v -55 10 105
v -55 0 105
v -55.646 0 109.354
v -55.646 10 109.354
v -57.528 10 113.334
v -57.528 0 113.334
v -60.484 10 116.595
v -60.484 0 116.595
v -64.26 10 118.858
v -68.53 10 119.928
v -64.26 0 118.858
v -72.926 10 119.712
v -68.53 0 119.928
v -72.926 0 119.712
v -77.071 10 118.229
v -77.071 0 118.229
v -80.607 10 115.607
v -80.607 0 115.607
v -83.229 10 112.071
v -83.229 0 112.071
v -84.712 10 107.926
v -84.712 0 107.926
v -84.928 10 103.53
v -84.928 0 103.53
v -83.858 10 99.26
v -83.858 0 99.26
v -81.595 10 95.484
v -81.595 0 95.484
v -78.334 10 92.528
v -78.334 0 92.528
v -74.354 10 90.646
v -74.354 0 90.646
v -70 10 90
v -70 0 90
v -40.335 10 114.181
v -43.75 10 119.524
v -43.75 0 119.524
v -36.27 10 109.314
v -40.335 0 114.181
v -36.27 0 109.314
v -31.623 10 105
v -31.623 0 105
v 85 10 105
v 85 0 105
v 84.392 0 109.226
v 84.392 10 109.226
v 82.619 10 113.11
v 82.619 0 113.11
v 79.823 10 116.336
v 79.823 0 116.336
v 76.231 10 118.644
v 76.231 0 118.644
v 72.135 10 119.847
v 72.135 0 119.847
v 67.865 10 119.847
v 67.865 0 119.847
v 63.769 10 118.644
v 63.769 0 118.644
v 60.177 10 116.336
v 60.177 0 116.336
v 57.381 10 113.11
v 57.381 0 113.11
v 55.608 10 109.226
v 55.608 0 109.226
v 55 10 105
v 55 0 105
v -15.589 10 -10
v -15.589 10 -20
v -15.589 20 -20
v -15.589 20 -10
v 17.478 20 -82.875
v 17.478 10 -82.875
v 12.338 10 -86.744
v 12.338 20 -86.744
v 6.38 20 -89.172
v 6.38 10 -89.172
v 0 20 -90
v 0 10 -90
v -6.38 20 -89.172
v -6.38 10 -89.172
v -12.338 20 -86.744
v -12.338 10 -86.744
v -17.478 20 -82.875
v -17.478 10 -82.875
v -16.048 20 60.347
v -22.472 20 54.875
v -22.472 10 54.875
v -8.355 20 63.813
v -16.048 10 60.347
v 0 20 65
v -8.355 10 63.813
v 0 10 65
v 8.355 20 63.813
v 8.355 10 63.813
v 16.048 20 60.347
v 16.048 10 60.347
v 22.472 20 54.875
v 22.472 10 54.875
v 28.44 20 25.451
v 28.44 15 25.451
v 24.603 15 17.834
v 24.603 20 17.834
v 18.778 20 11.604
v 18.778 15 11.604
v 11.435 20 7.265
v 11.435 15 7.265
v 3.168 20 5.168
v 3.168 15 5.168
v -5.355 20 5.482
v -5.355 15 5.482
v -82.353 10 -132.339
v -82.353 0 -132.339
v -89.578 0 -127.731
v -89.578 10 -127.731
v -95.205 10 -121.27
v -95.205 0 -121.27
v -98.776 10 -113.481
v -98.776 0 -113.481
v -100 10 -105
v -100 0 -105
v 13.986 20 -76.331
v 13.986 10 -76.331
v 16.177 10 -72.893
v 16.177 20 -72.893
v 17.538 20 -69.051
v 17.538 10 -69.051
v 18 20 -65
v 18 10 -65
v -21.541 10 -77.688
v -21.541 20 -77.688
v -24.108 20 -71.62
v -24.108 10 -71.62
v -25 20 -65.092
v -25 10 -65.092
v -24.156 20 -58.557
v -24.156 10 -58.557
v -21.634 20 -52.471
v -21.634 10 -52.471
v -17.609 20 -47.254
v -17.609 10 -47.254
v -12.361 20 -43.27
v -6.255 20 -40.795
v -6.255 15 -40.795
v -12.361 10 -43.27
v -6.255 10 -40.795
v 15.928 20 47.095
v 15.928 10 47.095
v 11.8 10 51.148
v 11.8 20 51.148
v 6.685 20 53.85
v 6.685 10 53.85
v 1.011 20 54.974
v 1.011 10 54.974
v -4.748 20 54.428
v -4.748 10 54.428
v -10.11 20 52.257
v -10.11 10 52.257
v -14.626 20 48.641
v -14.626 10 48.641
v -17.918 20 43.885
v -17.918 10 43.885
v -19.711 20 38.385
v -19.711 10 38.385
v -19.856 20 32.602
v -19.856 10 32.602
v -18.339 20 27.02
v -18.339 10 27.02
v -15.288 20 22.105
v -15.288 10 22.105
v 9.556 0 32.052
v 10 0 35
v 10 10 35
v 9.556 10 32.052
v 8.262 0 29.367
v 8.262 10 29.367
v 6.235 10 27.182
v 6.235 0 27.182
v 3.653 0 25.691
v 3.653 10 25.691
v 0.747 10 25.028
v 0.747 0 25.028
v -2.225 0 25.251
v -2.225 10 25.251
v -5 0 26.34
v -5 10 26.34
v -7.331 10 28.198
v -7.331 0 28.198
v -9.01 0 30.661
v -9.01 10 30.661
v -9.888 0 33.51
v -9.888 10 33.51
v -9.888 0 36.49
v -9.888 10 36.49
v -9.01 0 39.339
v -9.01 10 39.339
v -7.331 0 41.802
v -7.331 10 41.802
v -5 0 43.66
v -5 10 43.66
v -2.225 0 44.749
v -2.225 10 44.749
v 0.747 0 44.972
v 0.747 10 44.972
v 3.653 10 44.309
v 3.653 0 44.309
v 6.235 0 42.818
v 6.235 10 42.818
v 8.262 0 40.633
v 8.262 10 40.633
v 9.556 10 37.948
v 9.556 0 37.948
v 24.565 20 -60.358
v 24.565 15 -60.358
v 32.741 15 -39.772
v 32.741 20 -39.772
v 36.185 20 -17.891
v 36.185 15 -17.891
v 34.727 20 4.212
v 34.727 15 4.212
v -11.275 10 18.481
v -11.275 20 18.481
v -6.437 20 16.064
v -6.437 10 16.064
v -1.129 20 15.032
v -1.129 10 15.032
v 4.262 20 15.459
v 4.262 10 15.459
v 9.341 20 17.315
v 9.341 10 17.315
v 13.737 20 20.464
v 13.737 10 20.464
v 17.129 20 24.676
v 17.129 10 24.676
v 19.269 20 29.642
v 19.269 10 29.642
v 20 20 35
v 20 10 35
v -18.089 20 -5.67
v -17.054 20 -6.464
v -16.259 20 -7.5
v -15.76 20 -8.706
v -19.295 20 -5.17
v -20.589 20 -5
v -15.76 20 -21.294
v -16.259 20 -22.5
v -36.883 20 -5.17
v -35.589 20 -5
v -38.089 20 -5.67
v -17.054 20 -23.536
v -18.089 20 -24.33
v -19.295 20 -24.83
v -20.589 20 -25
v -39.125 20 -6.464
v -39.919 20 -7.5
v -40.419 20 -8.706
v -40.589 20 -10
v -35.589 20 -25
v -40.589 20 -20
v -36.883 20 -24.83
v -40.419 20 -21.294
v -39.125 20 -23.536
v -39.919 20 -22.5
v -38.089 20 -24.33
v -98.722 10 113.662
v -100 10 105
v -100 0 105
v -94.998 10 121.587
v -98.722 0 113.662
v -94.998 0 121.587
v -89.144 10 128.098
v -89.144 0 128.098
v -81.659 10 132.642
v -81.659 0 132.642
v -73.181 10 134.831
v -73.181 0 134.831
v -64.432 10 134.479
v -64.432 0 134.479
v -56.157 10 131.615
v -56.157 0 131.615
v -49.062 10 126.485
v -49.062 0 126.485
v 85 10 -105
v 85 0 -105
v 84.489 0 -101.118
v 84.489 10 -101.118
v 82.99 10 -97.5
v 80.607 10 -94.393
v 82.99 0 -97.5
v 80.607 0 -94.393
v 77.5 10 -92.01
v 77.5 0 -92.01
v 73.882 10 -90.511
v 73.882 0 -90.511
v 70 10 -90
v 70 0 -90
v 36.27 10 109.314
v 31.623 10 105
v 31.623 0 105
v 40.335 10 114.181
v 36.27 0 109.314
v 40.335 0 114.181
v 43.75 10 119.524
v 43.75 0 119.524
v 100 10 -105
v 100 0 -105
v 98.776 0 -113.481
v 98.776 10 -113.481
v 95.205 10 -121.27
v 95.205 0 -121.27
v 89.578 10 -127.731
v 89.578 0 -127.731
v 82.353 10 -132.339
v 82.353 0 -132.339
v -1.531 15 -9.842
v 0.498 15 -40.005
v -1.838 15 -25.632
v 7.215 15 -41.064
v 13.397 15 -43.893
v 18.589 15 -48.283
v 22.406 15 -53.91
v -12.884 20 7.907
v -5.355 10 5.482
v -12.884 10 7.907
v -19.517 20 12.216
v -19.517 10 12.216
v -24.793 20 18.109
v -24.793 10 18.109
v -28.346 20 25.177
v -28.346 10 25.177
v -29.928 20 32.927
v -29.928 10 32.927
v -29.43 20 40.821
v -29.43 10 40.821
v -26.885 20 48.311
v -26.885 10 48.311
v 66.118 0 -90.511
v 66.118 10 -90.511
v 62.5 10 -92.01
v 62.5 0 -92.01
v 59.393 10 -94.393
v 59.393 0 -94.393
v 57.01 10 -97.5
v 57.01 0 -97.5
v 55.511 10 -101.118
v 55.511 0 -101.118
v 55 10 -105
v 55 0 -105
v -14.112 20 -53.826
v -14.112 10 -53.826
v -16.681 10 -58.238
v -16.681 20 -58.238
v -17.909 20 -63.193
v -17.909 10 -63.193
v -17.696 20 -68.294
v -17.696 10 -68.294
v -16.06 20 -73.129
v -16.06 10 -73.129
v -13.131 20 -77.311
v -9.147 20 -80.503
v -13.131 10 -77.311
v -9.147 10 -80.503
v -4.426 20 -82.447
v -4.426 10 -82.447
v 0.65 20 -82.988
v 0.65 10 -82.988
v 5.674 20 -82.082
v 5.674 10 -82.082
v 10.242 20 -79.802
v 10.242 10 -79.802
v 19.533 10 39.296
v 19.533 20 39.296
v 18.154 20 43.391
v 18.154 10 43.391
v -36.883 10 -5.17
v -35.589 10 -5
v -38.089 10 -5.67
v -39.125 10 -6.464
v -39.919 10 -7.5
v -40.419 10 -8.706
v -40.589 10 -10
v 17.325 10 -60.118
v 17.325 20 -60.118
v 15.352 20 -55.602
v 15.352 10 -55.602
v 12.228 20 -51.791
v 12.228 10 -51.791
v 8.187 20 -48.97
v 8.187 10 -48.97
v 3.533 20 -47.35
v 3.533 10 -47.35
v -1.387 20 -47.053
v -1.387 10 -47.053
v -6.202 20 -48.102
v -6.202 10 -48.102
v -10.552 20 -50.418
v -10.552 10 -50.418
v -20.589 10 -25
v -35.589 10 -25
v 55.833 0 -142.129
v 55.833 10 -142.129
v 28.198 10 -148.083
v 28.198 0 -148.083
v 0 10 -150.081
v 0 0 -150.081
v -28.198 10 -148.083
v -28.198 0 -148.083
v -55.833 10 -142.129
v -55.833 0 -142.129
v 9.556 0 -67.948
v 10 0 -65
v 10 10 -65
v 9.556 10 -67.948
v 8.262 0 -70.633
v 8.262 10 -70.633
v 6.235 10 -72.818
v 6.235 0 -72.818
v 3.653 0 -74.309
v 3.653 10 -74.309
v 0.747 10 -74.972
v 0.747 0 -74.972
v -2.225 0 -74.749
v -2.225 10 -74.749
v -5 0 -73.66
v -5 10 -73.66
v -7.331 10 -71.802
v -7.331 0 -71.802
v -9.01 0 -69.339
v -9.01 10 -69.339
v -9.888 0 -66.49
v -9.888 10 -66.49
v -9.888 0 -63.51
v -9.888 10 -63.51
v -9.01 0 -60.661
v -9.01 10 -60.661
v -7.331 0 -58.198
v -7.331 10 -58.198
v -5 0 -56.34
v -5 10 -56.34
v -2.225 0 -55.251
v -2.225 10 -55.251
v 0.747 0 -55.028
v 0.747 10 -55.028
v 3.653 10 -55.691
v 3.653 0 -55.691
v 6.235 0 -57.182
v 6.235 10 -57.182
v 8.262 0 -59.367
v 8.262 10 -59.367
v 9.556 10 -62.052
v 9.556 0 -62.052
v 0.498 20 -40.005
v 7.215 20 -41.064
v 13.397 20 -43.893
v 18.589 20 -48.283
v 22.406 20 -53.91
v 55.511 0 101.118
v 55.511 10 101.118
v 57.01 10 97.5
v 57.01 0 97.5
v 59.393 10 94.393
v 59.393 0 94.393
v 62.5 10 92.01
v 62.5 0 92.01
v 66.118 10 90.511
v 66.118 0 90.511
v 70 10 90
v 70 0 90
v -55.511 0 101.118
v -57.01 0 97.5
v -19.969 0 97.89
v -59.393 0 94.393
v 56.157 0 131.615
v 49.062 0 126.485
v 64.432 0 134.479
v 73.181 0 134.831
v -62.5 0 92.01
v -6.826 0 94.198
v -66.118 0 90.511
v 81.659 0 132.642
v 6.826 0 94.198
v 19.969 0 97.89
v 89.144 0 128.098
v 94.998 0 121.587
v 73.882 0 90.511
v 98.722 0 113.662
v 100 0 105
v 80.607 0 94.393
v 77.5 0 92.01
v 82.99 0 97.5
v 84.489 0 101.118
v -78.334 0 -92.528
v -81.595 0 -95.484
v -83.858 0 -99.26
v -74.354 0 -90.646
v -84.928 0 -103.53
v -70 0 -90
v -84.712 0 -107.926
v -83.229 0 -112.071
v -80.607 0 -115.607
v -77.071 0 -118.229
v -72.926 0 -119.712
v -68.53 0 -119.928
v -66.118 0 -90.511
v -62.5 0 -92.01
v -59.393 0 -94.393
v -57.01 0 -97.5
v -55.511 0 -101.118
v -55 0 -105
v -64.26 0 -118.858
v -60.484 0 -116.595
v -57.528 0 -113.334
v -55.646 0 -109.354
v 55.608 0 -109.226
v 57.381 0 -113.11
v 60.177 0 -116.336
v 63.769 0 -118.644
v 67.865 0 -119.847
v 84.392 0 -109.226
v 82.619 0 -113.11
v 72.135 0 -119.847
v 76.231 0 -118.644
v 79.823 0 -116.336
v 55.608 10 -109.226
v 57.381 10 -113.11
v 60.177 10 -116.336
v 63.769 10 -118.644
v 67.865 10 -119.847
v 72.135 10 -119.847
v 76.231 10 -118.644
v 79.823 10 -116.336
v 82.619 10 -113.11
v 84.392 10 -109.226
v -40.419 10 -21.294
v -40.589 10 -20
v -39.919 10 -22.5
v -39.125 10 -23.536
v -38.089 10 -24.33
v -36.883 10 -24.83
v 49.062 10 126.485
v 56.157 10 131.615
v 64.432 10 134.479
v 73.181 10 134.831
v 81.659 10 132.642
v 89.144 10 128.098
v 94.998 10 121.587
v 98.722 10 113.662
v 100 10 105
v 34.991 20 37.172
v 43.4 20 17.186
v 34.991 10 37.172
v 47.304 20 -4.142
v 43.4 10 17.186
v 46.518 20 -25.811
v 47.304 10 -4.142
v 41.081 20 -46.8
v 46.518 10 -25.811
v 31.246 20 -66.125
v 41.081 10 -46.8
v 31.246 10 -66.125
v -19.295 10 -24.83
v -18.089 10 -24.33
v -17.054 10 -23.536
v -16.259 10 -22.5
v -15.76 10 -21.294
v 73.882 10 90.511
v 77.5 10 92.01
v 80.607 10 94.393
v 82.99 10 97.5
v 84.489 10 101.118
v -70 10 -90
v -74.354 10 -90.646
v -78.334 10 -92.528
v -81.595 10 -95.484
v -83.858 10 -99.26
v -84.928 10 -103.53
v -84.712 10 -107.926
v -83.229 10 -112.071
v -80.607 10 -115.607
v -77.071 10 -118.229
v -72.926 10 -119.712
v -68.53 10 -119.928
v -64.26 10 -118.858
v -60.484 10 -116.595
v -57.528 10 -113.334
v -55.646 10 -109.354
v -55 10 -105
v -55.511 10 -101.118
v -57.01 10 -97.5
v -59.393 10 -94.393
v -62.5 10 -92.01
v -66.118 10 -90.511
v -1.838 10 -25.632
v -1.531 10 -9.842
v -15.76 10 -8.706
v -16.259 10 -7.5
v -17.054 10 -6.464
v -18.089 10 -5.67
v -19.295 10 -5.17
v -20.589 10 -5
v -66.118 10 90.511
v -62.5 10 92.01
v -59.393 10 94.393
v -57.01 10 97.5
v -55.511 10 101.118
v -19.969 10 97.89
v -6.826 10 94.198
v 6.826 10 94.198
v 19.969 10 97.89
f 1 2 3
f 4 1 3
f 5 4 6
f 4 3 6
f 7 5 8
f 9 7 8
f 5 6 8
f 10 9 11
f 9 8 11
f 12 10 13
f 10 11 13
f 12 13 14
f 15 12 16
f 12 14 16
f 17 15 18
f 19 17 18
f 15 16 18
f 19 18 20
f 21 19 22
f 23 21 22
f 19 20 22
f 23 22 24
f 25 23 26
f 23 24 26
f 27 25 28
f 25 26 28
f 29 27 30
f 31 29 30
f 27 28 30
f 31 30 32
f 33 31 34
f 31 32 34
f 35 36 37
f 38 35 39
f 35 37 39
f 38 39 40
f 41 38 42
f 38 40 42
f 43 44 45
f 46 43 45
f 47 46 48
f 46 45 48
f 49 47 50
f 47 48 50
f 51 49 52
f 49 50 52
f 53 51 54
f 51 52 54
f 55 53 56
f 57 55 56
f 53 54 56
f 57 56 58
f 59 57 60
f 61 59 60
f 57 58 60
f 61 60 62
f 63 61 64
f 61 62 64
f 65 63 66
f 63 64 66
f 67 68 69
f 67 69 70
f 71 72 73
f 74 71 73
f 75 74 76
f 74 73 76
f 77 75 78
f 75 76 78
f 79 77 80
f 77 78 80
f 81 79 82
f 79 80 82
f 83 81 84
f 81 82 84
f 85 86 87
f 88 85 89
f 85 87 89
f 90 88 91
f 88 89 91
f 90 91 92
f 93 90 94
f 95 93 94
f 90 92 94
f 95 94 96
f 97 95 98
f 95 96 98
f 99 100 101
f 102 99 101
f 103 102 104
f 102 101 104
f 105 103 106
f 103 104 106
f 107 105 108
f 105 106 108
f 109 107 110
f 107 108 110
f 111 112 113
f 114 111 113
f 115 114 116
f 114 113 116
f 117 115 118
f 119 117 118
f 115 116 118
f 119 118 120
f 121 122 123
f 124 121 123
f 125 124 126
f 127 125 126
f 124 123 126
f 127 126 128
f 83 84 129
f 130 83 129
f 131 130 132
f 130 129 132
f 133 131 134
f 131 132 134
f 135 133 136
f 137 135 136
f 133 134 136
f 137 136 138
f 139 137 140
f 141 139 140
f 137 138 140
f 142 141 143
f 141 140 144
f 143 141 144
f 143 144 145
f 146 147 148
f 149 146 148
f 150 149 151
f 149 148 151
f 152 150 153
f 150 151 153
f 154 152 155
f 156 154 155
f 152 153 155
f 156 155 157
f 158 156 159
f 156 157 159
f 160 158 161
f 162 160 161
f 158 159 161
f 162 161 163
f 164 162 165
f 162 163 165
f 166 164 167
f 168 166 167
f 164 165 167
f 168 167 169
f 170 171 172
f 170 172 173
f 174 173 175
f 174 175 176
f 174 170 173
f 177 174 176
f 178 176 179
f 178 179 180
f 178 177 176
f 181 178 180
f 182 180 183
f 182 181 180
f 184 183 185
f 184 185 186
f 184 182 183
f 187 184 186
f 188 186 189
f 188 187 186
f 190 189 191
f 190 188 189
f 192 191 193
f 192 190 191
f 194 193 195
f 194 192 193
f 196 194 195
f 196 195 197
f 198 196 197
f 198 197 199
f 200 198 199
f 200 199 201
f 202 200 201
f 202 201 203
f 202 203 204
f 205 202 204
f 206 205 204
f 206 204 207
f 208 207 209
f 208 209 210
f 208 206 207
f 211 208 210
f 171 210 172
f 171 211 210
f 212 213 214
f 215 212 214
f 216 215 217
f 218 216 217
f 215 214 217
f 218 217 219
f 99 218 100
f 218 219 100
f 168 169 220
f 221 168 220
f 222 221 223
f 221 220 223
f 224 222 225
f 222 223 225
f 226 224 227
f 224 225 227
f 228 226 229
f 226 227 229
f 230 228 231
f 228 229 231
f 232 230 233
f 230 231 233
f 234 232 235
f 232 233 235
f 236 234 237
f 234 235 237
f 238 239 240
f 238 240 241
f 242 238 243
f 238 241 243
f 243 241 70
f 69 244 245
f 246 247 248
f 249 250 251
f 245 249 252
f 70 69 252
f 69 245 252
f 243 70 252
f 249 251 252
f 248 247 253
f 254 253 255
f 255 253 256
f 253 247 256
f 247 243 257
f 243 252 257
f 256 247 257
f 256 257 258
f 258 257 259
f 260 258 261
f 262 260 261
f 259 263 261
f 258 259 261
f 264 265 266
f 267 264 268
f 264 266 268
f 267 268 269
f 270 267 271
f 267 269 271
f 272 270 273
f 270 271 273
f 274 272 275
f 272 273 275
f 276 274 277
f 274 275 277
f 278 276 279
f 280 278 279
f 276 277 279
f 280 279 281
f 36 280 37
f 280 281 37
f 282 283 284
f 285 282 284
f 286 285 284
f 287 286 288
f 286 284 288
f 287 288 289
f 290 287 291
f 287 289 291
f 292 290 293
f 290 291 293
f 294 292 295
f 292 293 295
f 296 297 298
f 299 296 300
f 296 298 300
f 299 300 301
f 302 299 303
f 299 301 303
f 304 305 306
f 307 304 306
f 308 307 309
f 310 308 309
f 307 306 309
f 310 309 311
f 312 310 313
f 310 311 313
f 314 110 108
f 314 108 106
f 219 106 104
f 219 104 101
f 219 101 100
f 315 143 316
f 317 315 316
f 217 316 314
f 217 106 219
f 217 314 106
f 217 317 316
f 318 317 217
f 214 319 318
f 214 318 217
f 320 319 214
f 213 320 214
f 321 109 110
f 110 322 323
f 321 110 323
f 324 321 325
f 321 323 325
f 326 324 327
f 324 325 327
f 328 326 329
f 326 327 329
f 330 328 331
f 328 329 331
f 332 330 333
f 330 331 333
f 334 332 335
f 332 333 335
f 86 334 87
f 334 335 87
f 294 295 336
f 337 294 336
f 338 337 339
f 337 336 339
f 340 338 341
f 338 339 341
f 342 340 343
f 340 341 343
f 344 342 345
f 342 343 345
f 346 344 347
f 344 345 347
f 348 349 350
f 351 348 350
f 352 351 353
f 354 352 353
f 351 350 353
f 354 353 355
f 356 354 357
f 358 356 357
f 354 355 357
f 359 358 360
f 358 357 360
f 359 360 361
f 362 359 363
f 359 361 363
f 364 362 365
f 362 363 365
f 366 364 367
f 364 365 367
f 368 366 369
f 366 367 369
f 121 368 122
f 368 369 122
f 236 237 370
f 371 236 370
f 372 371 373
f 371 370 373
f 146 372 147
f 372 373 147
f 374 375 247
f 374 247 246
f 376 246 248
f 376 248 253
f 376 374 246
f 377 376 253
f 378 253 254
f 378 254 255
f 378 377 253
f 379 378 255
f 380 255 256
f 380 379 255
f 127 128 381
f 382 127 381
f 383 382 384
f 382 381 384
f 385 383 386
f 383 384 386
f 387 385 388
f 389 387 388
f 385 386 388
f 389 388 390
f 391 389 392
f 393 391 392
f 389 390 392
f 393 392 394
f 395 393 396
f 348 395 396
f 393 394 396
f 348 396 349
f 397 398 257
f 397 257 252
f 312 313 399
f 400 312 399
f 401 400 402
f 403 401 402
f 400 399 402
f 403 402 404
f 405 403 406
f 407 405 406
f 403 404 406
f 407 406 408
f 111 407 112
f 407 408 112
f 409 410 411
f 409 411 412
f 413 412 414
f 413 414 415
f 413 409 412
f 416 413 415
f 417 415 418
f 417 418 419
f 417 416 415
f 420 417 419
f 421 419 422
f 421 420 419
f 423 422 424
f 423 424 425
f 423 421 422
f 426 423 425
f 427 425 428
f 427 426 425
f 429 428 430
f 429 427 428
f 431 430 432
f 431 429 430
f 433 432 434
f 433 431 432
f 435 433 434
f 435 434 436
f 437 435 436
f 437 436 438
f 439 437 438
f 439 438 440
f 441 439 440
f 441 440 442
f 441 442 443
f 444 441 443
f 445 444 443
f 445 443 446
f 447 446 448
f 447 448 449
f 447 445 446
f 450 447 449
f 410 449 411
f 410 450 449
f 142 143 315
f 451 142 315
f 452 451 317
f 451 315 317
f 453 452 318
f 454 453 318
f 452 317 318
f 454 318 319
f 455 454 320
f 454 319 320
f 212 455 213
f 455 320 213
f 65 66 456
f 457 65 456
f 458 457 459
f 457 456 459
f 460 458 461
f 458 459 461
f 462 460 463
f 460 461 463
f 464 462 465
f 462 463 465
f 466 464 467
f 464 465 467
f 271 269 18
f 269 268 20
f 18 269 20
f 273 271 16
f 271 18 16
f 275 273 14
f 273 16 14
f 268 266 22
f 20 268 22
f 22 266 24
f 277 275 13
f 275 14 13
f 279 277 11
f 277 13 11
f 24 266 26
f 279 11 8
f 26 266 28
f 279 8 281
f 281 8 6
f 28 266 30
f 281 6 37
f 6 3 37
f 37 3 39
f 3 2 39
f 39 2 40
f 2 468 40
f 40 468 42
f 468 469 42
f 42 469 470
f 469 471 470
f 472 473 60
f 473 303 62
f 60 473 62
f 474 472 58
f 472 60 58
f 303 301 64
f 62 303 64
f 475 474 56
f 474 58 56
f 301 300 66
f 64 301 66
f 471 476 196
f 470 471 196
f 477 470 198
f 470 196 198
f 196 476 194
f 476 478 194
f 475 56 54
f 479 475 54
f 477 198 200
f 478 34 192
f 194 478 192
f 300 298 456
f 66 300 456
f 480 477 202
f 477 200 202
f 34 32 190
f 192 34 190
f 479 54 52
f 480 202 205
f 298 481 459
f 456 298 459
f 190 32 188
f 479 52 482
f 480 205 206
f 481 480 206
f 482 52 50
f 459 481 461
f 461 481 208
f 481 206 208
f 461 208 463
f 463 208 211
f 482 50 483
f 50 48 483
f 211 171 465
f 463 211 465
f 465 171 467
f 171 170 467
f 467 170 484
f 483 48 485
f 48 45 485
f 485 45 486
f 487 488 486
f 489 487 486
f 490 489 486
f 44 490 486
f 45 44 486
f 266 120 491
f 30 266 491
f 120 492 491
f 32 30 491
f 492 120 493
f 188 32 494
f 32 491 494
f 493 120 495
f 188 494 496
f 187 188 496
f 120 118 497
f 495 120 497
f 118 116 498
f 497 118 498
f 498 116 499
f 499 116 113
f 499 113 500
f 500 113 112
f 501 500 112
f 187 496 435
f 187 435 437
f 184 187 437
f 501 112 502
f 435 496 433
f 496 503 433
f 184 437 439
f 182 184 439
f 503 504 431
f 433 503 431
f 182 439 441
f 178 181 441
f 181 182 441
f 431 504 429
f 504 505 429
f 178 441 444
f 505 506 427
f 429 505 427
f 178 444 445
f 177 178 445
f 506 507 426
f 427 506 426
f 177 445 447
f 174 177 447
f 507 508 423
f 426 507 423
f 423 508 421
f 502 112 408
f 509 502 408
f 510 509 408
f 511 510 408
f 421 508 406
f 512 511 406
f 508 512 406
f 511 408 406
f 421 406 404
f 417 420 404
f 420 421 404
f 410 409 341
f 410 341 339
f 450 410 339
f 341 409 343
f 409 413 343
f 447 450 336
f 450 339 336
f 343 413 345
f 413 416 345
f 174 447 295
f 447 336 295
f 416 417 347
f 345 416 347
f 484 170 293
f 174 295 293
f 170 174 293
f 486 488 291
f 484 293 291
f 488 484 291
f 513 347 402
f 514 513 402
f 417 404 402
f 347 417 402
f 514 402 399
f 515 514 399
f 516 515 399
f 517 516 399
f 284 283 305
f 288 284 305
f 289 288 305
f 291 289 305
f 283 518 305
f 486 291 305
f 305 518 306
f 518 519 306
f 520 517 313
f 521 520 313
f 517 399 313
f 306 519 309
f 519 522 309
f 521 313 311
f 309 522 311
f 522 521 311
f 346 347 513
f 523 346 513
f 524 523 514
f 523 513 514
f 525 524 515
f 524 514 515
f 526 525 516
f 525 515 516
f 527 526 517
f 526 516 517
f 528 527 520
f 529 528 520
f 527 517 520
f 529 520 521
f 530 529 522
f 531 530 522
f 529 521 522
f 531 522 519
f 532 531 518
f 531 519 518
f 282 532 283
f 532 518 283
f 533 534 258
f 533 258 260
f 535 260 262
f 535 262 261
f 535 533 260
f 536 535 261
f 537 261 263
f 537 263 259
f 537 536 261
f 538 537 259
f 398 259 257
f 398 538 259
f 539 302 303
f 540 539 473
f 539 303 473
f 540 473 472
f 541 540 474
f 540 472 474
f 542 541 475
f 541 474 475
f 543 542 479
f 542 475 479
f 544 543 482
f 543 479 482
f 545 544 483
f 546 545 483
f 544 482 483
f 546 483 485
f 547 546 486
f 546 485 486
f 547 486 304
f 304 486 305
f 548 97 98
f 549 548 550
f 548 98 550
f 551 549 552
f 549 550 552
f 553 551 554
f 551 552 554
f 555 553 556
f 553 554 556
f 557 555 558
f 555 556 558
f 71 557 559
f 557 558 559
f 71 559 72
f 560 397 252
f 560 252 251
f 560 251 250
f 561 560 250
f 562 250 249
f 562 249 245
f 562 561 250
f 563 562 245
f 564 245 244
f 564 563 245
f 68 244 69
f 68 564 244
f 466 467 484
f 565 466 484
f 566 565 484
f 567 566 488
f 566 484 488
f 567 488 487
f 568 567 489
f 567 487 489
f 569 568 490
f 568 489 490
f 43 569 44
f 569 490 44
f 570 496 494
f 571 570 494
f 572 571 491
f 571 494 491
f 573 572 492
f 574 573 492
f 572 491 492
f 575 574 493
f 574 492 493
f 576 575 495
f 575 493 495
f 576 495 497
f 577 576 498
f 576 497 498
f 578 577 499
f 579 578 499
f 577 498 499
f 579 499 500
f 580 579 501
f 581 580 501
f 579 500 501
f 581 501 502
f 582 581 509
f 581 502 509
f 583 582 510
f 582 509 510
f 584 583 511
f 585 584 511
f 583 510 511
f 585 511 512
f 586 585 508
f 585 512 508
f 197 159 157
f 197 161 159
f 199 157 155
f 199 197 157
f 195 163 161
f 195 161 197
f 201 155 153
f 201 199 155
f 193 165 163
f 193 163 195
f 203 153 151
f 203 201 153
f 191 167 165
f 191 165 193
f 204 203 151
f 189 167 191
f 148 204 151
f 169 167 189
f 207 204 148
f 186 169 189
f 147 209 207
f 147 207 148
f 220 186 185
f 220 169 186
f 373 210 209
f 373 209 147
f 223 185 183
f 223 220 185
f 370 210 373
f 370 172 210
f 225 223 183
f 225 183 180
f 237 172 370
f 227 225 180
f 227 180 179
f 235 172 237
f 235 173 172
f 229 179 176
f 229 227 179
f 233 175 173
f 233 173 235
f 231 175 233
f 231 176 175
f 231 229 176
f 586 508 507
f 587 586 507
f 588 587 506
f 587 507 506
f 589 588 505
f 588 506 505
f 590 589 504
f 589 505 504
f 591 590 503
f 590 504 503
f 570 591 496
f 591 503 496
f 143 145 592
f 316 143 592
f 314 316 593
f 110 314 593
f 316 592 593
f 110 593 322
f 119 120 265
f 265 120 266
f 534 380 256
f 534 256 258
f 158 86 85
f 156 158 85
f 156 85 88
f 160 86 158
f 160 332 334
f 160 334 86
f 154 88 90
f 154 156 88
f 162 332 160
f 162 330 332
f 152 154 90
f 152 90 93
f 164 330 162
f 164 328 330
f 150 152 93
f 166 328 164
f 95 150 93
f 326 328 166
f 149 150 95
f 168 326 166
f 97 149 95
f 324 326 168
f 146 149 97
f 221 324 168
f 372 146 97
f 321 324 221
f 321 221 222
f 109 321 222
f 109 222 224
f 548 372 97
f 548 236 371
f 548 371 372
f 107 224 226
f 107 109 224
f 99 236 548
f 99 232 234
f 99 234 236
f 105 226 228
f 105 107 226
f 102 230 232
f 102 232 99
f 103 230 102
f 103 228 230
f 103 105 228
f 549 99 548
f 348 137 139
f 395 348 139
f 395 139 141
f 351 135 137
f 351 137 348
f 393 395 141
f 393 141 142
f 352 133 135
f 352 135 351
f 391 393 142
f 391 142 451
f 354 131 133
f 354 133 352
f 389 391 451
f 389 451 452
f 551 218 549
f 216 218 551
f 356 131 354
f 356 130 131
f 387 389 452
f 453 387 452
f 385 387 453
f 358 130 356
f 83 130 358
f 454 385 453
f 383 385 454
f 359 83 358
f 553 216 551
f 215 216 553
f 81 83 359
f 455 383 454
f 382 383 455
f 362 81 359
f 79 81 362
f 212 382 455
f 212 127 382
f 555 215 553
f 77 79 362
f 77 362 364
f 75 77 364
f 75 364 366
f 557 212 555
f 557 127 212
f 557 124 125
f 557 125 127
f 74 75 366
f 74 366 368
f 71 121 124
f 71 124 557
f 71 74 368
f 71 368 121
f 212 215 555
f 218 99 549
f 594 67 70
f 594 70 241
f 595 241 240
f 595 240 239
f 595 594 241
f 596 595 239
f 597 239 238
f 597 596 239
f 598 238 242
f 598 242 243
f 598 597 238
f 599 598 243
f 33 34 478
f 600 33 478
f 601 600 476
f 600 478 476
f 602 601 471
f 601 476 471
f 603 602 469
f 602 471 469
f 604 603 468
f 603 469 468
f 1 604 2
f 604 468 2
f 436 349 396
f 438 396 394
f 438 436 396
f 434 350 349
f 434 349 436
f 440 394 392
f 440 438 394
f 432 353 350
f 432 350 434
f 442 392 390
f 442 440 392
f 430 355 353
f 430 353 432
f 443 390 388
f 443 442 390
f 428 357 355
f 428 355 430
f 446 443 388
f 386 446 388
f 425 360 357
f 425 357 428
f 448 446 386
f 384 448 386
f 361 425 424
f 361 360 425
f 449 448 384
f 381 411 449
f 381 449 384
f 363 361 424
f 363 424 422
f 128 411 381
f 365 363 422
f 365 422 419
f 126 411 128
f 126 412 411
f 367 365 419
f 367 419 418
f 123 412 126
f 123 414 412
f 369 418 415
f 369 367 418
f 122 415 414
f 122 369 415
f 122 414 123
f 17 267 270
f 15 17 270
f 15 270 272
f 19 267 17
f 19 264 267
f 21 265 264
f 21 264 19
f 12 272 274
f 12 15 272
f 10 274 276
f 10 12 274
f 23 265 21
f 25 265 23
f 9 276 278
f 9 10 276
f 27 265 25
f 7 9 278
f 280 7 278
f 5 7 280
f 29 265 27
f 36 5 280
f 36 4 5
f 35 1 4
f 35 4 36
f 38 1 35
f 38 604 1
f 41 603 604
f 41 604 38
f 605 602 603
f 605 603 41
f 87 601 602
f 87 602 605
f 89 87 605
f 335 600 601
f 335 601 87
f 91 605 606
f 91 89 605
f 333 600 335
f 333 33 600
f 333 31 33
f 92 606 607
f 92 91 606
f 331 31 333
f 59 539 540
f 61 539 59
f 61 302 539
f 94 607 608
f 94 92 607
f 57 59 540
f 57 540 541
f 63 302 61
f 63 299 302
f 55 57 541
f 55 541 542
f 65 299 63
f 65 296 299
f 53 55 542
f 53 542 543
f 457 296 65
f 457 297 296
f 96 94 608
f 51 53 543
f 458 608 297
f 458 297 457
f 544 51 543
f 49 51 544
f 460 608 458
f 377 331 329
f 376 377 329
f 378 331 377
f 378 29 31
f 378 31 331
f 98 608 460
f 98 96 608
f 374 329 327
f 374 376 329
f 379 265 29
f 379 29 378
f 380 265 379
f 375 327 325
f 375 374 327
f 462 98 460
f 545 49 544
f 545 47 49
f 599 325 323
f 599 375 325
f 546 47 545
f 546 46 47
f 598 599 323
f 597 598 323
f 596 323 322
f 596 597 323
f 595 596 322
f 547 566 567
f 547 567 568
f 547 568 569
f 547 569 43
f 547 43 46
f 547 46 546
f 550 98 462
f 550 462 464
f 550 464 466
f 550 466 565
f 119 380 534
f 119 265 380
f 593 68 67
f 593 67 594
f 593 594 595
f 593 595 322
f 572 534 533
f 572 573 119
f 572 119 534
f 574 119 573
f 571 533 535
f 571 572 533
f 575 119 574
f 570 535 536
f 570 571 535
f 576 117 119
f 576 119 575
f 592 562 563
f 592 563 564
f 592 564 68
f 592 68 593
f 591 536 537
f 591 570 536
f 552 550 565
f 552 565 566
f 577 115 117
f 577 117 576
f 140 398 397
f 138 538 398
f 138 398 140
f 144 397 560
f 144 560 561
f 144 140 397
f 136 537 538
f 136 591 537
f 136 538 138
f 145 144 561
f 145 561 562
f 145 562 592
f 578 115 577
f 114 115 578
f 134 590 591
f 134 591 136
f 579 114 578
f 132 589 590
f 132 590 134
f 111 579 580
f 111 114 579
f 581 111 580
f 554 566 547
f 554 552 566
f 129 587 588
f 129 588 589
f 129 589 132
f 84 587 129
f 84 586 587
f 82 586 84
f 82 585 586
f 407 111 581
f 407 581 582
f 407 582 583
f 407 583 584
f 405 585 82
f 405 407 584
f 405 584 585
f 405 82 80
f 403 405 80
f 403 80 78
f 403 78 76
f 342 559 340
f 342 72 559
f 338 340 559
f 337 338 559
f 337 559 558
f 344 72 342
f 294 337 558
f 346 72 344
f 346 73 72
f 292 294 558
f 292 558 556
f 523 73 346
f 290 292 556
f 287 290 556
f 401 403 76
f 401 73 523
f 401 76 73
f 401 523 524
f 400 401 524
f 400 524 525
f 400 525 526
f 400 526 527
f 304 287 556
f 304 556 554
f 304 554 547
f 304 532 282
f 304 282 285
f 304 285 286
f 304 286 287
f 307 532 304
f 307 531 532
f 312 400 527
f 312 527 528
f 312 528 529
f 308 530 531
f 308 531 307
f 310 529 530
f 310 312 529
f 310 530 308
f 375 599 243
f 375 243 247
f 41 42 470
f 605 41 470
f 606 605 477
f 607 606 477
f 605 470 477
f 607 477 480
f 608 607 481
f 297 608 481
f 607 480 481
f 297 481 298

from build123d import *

# Parameters (mm, degrees)
SKETCH1_R           = 15
SKETCH1_R_2         = 10
BOSS_EXTRUDE1_DEPTH = 10
SKETCH1_3_R         = 20
SKETCH1_3_R_2       = 18
BOSS_EXTRUDE2_DEPTH = 20
BOSS_EXTRUDE3_DEPTH = 15


with BuildPart() as part:
    # Sketch1 → Boss-Extrude1 (new body)
    with BuildSketch(Plane(origin=(0, 0, 0), x_dir=(1, 0, 0), z_dir=(0, 1, 0))):
        with BuildLine():
            Line((-100, 105), (-100, -105))
            ThreePointArc((-100, -105), (-77.5, -134.047375097), (-43.75, -119.523687548))
            ThreePointArc((-43.75, -119.523687548), (0, -93.729833462), (43.75, -119.523687548))
            ThreePointArc((43.75, -119.523687548), (77.5, -134.047375097), (100, -105))
            Line((100, -105), (100, 105))
            ThreePointArc((100, 105), (95.205041513, 121.269784336), (82.352941176, 132.338705973))
            ThreePointArc((82.352941176, 132.338705973), (0, 150.080666152), (-82.352941176, 132.338705973))
            ThreePointArc((-82.352941176, 132.338705973), (-95.205041513, 121.269784336), (-100, 105))
        make_face()
        with Locations((-70, 105)):
            Circle(SKETCH1_R, mode=Mode.SUBTRACT)
        with Locations((-70, -105)):
            Circle(SKETCH1_R, mode=Mode.SUBTRACT)
        with Locations((70, 105)):
            Circle(SKETCH1_R, mode=Mode.SUBTRACT)
        with Locations((70, -105)):
            Circle(SKETCH1_R, mode=Mode.SUBTRACT)
        with Locations((0, -35)):
            Circle(SKETCH1_R_2, mode=Mode.SUBTRACT)
        with Locations((0, 65)):
            Circle(SKETCH1_R_2, mode=Mode.SUBTRACT)
    extrude(amount=BOSS_EXTRUDE1_DEPTH)

    # Sketch1<3> → Boss-Extrude2 (add)
    # profile 1 of 2: a face of its own
    with BuildSketch(Plane(origin=(0, 0, 0), x_dir=(1, 0, 0), z_dir=(0, 1, 0))):
        with BuildLine():
            ThreePointArc((-40.589236585, 10), (-39.124770491, 6.464466094), (-35.589236585, 5))
            Line((-35.589236585, 5), (-20.589236585, 5))
            ThreePointArc((-20.589236585, 5), (-17.053702679, 6.464466094), (-15.589236585, 10))
            Line((-15.589236585, 10), (-15.589236585, 20))
            ThreePointArc((-15.589236585, 20), (-17.053702679, 23.535533906), (-20.589236585, 25))
            Line((-20.589236585, 25), (-35.589236585, 25))
            ThreePointArc((-35.589236585, 25), (-39.124770491, 23.535533906), (-40.589236585, 20))
            Line((-40.589236585, 20), (-40.589236585, 10))
        make_face()
    # profile 2 of 2: a face of its own
    with BuildSketch(Plane(origin=(0, 0, 0), x_dir=(1, 0, 0), z_dir=(0, 1, 0))):
        with BuildLine():
            ThreePointArc((28.439679063, -25.450934351), (-29.401361297, -29.036783258), (22.4718574, -54.875))
            ThreePointArc((22.4718574, -54.875), (47.50001952, 14.997844187), (17.478111311, 82.875))
            ThreePointArc((17.478111311, 82.875), (-23.846726615, 57.494426755), (24.565221674, 60.357814729))
            ThreePointArc((24.565221674, 60.357814729), (36.184989958, 17.890628558), (28.439679063, -25.450934351))
        make_face()
        with Locations((0, -35)):
            Circle(SKETCH1_3_R, mode=Mode.SUBTRACT)
        with Locations((0, 65)):
            Circle(SKETCH1_3_R_2, mode=Mode.SUBTRACT)
    extrude(amount=BOSS_EXTRUDE2_DEPTH)

    # Sketch1<4> → Boss-Extrude3 (add)
    with BuildSketch(Plane(origin=(0, 0, 0), x_dir=(1, 0, 0), z_dir=(0, 1, 0))):
        with BuildLine():
            ThreePointArc((-6.254967912, 40.795137339), (-1.162830862, 17.74699723), (-5.354714274, -5.481750813))
            ThreePointArc((-5.354714274, -5.481750813), (15.261748675, -9.172126929), (28.439679063, -25.450934351))
            ThreePointArc((28.439679063, -25.450934351), (36.184989958, 17.890628558), (24.565221674, 60.357814729))
            ThreePointArc((24.565221674, 60.357814729), (13.397422695, 43.892914338), (-6.254967912, 40.795137339))
        make_face()
    extrude(amount=BOSS_EXTRUDE3_DEPTH)


solid = part.part
